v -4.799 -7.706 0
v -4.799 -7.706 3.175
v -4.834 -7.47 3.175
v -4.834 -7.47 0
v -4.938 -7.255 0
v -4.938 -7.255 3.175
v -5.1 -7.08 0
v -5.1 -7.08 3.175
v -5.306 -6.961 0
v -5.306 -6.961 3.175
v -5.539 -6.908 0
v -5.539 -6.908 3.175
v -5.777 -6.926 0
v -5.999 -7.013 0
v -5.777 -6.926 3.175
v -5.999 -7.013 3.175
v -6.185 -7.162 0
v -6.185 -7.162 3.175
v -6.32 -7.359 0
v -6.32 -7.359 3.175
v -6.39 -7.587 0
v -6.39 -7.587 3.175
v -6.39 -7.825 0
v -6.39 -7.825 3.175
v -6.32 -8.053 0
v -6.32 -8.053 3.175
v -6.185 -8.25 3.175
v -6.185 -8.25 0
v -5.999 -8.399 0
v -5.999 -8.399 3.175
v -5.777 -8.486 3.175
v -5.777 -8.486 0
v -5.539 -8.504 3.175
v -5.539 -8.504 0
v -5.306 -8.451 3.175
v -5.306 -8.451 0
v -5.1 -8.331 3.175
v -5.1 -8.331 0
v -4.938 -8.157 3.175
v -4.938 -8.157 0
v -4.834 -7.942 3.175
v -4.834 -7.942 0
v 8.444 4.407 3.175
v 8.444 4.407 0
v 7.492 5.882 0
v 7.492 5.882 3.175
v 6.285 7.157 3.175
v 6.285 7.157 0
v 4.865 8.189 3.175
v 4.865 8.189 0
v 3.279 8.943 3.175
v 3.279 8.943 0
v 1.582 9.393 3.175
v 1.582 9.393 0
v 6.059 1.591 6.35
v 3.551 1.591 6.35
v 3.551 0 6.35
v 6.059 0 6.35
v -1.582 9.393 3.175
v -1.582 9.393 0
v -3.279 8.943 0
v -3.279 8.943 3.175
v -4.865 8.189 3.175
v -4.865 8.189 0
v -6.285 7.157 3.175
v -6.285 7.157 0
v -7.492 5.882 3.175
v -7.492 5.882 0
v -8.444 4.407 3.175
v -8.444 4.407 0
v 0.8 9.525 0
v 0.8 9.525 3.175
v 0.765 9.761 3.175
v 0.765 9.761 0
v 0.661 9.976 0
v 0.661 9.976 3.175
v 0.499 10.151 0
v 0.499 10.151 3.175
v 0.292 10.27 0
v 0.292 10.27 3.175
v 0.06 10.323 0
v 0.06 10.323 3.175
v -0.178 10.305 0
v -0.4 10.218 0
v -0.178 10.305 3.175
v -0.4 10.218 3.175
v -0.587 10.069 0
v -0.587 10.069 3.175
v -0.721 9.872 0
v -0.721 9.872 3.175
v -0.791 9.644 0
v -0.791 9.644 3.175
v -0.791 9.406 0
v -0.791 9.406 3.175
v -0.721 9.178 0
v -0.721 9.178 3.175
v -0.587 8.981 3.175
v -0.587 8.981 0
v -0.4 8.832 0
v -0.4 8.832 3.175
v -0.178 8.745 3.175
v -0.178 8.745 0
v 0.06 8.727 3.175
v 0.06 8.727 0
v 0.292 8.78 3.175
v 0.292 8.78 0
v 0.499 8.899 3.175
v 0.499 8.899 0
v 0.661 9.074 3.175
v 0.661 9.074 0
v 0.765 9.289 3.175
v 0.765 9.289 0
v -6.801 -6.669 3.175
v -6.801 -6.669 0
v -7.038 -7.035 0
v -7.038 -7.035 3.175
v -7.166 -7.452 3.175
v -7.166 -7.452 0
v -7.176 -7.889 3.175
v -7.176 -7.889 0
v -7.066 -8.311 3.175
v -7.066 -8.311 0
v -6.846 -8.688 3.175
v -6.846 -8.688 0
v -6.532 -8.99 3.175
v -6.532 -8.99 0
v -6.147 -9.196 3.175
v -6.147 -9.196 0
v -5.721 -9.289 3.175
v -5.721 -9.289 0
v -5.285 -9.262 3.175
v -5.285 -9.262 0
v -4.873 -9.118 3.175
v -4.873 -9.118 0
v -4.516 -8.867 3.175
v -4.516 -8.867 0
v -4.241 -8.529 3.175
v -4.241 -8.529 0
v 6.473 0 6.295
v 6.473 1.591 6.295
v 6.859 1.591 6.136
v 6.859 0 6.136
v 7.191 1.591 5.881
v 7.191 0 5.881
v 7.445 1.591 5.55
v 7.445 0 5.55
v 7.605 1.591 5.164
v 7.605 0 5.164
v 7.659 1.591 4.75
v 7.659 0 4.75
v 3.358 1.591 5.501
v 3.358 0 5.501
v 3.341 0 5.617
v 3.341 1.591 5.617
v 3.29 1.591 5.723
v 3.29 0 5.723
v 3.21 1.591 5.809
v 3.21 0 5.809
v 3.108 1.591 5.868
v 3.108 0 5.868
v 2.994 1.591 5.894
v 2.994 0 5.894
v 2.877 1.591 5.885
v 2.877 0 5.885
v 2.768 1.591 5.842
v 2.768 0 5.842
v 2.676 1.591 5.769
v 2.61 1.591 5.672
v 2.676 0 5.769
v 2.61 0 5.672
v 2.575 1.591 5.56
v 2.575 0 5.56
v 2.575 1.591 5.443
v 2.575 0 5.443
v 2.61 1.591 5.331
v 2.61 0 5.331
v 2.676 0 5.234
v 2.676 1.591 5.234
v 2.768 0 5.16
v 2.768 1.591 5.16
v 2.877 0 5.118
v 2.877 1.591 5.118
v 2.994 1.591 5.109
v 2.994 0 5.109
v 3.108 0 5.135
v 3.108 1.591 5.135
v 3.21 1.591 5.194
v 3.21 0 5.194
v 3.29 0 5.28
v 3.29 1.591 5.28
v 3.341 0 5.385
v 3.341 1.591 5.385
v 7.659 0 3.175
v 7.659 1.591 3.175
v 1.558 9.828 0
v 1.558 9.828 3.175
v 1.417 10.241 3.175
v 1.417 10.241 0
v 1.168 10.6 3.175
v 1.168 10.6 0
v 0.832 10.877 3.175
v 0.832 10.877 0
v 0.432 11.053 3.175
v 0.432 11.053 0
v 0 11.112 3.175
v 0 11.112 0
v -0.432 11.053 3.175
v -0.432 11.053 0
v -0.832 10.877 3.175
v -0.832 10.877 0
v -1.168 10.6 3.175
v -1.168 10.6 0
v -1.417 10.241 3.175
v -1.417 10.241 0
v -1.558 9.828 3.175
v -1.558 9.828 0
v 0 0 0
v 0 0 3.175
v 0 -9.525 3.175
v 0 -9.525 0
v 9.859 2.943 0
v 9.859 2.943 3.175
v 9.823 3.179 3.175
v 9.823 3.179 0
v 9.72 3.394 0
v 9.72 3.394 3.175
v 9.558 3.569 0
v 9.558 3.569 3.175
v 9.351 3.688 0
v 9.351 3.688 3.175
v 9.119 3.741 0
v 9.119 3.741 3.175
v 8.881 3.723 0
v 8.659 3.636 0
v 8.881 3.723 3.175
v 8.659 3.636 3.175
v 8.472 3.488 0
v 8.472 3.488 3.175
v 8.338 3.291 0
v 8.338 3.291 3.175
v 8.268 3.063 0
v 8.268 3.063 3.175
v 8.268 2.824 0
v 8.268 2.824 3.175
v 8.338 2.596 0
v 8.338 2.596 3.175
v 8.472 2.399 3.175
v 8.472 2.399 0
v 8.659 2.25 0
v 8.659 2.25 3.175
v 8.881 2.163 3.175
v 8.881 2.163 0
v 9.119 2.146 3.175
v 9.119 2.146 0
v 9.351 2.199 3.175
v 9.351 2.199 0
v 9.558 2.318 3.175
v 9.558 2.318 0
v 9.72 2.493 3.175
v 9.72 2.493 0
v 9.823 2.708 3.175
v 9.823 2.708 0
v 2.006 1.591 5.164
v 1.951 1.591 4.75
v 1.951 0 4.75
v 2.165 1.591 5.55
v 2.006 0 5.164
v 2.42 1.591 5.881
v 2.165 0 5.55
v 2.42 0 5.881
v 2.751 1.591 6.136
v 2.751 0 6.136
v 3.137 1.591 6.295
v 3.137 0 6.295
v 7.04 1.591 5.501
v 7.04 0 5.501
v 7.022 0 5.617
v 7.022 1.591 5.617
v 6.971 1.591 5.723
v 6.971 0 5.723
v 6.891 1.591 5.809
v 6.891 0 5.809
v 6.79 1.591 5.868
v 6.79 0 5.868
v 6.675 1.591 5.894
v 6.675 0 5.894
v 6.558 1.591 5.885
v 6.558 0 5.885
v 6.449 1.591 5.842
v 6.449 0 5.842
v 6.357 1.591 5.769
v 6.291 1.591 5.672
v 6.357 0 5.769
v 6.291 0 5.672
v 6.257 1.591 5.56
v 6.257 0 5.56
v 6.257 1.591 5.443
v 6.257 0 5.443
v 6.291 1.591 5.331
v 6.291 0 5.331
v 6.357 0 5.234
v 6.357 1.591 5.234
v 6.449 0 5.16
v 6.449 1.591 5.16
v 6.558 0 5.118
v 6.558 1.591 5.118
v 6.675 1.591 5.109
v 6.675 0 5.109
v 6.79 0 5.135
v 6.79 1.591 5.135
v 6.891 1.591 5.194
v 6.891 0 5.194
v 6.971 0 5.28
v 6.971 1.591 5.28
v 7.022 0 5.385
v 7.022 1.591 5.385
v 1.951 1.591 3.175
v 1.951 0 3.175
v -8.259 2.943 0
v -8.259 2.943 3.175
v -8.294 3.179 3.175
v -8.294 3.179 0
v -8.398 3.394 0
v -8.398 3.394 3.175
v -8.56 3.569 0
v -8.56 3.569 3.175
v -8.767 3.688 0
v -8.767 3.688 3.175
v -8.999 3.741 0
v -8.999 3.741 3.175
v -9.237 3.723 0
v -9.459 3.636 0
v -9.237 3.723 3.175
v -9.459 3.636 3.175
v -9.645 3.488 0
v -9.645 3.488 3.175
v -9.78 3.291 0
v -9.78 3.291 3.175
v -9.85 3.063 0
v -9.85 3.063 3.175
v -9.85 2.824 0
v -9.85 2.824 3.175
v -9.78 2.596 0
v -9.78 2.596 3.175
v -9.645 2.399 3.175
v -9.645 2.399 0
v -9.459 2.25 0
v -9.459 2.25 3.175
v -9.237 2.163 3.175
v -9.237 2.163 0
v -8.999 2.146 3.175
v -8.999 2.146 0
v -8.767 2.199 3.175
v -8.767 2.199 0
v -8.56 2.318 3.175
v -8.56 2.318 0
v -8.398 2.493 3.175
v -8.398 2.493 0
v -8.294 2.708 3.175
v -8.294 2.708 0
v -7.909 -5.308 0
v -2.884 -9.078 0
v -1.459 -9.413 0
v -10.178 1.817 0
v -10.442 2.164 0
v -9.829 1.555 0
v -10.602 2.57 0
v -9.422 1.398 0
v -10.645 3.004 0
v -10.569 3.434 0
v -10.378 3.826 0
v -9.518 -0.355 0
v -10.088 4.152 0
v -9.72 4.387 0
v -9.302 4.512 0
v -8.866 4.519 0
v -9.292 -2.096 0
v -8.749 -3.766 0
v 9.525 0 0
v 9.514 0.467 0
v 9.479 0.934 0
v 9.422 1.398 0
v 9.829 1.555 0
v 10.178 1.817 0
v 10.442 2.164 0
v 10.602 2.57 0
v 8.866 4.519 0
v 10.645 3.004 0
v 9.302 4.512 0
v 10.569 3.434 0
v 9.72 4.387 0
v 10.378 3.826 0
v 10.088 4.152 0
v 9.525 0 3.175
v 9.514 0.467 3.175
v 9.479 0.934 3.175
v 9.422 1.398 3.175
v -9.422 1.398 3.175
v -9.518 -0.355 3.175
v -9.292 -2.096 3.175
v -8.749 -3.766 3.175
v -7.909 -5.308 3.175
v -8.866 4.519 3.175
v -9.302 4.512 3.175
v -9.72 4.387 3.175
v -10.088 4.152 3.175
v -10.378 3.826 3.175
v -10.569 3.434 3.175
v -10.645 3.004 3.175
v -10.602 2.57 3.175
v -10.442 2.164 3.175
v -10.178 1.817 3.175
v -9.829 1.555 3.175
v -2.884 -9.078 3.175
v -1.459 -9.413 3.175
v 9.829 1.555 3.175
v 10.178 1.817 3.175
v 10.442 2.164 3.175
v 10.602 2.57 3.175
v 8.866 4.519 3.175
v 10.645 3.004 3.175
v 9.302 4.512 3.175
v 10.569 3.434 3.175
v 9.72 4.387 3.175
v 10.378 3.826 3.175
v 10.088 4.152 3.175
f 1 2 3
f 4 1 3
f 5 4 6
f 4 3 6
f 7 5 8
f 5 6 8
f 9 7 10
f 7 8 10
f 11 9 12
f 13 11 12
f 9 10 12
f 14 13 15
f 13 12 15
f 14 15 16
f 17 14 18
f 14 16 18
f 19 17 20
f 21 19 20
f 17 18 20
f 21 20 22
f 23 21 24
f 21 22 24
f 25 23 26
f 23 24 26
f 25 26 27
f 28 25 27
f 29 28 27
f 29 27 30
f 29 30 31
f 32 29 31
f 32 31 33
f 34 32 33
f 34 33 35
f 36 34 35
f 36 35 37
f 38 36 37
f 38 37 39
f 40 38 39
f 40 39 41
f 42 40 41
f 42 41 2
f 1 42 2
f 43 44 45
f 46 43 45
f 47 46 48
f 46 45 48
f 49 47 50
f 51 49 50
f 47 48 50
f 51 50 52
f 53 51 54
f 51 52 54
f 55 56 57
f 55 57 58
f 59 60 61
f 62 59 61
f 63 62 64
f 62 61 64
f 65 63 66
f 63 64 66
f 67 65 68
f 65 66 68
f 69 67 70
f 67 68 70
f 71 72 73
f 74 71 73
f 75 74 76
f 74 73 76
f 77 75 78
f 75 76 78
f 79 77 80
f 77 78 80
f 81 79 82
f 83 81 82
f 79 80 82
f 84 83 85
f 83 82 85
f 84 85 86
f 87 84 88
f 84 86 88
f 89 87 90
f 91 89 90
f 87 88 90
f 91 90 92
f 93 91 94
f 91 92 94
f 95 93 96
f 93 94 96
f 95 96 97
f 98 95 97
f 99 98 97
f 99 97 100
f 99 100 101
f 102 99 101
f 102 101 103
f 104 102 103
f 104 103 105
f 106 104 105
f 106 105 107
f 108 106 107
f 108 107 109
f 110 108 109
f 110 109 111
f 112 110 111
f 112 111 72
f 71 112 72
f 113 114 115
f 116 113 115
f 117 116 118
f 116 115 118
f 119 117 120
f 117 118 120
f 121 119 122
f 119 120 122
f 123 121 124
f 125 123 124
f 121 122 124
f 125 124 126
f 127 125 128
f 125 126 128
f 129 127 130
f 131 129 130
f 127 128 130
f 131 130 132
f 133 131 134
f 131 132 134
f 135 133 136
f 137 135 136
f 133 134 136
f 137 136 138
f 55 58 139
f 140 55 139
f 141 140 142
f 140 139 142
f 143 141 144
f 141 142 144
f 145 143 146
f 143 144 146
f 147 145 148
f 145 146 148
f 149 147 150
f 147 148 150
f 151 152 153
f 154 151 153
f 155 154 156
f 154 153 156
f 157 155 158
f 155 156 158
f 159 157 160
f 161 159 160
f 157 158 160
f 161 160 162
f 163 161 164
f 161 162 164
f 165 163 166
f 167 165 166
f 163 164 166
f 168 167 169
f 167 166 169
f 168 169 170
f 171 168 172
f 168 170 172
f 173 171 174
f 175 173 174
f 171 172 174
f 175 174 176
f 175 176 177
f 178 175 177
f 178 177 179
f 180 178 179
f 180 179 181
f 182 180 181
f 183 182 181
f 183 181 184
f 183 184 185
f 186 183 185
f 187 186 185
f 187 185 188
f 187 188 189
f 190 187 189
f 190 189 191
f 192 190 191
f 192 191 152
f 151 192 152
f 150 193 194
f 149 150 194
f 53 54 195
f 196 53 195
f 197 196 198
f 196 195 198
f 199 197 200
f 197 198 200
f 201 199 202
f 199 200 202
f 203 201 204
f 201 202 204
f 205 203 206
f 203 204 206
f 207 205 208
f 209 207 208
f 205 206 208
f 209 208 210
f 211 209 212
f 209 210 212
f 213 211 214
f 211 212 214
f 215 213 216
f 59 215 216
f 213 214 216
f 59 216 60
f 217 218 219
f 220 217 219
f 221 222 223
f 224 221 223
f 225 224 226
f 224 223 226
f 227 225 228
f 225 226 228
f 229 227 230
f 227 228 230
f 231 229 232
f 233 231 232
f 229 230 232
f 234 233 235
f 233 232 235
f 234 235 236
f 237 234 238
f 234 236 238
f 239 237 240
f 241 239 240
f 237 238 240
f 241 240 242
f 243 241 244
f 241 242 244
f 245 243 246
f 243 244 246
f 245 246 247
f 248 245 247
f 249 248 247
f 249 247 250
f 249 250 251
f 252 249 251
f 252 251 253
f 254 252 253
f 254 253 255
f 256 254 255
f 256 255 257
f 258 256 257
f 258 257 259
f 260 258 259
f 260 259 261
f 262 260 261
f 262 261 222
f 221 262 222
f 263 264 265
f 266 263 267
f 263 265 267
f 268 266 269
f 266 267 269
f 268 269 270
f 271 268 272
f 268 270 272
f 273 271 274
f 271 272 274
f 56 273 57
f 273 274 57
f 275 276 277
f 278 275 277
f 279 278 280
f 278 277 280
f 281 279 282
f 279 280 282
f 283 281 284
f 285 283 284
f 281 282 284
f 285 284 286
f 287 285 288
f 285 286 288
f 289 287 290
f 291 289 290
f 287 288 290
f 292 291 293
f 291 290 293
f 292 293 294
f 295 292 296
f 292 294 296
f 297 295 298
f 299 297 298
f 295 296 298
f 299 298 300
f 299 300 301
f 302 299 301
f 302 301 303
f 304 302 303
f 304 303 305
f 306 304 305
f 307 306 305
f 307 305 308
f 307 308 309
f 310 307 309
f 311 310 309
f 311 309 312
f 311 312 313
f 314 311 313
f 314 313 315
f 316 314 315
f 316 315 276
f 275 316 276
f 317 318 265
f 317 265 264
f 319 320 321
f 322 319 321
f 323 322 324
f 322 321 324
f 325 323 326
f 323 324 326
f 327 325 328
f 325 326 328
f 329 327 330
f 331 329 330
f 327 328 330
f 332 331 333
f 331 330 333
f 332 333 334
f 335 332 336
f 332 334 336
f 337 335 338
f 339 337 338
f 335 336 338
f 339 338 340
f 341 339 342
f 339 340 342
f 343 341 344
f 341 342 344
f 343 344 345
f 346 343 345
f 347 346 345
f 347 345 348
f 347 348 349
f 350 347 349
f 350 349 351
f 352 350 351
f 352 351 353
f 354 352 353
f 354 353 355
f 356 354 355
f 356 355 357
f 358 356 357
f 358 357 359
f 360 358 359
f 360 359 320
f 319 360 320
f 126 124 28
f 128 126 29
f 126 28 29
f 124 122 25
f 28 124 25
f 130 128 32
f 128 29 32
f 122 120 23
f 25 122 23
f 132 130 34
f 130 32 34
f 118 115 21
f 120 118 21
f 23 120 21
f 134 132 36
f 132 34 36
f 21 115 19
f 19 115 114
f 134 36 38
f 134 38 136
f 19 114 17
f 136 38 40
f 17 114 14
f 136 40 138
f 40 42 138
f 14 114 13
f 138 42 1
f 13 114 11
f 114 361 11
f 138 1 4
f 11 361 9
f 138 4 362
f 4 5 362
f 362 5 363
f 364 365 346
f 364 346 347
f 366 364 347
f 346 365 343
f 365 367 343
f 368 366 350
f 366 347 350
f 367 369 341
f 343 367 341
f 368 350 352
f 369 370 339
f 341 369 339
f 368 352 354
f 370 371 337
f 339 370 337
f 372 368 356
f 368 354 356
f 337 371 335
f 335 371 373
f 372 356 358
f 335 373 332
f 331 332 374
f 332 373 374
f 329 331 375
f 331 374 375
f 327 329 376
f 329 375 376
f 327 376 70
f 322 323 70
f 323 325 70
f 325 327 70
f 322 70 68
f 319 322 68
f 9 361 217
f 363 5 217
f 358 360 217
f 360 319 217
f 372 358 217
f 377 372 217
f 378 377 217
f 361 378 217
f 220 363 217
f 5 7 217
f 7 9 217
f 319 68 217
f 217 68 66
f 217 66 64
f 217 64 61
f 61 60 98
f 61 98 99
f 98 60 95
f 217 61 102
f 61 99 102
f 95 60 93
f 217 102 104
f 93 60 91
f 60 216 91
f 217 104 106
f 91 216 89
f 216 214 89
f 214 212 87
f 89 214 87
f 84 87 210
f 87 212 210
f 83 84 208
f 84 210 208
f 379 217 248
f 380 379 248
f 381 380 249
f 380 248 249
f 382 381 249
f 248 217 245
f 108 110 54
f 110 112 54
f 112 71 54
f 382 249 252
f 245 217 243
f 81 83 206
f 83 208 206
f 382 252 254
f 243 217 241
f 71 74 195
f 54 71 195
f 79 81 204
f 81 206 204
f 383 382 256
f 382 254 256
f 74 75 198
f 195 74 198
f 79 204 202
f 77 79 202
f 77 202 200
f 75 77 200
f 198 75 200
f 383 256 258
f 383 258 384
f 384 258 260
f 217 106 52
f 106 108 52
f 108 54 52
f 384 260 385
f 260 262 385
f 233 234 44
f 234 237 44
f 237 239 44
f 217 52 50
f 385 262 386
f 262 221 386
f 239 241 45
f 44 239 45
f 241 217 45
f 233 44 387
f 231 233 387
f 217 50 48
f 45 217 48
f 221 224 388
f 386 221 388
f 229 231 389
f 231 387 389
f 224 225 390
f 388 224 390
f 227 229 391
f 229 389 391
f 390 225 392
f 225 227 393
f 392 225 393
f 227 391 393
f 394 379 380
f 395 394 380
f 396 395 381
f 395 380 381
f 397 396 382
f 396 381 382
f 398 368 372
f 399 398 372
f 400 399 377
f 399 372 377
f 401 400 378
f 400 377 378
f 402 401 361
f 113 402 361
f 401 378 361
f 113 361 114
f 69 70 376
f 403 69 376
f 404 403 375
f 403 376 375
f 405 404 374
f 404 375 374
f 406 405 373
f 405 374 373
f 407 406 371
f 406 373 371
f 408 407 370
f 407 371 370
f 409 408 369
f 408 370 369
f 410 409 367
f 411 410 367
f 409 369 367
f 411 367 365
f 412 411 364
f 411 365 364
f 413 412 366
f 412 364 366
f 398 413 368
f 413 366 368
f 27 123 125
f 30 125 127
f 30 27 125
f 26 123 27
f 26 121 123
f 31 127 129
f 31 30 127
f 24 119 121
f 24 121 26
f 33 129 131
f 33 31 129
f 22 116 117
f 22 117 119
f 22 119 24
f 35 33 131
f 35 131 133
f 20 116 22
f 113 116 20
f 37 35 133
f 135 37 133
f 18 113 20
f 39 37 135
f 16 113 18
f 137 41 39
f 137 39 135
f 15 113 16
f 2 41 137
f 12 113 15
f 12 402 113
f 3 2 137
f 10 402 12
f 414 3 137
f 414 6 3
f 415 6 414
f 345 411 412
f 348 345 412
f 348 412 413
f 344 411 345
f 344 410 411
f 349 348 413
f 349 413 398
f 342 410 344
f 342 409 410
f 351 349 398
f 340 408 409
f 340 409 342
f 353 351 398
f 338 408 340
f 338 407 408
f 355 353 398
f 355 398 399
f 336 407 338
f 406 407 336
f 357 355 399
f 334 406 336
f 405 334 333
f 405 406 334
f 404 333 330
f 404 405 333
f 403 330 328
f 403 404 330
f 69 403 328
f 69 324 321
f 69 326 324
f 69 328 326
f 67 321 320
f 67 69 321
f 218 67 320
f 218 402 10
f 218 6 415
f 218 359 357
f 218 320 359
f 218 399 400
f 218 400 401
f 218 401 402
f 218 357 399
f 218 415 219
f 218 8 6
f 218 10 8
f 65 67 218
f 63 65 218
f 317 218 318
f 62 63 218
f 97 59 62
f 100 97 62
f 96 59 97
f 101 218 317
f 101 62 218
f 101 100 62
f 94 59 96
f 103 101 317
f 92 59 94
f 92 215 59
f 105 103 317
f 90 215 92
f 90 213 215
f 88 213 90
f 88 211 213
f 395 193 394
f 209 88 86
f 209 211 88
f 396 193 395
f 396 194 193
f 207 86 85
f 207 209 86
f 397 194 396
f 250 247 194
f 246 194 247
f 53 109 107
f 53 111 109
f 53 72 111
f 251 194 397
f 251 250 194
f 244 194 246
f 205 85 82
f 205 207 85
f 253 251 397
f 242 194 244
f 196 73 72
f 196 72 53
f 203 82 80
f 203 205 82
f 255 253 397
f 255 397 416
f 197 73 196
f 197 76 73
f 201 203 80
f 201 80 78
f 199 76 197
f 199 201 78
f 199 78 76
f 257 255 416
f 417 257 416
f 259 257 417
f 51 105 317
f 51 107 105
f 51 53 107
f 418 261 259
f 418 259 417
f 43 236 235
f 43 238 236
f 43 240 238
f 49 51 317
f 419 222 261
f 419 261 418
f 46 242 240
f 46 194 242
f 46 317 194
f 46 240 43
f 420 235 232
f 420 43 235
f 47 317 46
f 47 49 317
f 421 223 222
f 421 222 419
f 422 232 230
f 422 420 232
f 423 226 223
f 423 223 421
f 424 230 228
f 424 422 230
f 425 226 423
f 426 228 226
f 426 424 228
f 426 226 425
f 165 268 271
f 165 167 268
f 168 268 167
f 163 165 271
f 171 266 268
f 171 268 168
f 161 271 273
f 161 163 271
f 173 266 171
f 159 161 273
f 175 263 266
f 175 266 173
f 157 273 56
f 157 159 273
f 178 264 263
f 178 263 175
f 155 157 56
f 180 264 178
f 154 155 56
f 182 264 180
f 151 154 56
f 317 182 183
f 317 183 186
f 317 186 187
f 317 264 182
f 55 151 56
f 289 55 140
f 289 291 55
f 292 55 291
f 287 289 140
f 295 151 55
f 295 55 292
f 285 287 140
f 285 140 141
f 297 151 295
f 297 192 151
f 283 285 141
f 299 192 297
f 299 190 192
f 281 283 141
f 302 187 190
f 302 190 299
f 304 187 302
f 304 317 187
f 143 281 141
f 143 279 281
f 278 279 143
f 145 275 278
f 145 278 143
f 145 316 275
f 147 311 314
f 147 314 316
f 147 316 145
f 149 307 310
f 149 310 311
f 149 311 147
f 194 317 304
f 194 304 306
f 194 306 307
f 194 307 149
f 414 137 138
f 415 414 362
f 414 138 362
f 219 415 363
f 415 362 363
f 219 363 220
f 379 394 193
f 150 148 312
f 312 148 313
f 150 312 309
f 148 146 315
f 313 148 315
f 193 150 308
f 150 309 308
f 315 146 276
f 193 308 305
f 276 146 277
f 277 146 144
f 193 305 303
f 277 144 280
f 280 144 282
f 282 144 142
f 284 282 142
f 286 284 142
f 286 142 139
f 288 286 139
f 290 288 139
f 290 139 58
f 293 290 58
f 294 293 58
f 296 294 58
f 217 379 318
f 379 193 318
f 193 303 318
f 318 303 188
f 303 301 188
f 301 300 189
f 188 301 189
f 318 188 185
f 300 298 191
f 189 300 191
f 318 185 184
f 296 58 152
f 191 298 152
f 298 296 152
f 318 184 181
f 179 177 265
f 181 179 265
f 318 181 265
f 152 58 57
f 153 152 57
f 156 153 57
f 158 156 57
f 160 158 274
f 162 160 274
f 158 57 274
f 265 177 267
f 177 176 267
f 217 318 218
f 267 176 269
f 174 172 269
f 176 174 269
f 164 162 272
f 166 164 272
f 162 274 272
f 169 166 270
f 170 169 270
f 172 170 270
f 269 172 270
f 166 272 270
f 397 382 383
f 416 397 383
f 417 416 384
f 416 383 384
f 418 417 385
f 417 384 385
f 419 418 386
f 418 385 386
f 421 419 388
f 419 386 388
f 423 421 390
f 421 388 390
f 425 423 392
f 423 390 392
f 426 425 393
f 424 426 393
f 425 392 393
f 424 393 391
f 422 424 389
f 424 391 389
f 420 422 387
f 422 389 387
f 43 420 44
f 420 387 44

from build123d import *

# Parameters (mm, degrees)
F2_DEPTH  = 3.175
F4_DEPTH  = 3.175
F5_R      = 0.8001
F6_DEPTH  = 3.2004
F7_R      = 0.8001
F8_DEPTH  = 25.4
F9_W      = 5.7083697757
F9_H      = 1.5914540656
F10_DEPTH = 3.175
F12_DEPTH = 25.4
F13_R     = 0.3937
F14_DEPTH = 25.4


with BuildPart() as f2:
    # F1 (on face) → F2 (new body)
    with BuildSketch(Plane.XY):
        with BuildLine():
            ThreePointArc((-1.5819782441, 9.3927083333), (-6.1504992572, -7.2730312723), (9.525, 0))
            ThreePointArc((9.525, 0), (7.2730312723, 6.1504992572), (1.5819782441, 9.3927083333))
            ThreePointArc((1.5819782441, 9.3927083333), (1.191708121, 9.4501564407), (0.7993940003, 9.4913958))
            ThreePointArc((0.7993940003, 9.4913958), (0, 8.7249), (-0.7993940003, 9.4913958))
            ThreePointArc((-0.7993940003, 9.4913958), (-1.191708121, 9.4501564407), (-1.5819782441, 9.3927083333))
        make_face()
        with BuildLine():
            ThreePointArc((0.7993940003, 9.4913958), (1.191708121, 9.4501564407), (1.5819782441, 9.3927083333))
            ThreePointArc((1.5819782441, 9.3927083333), (0, 11.1125), (-1.5819782441, 9.3927083333))
            ThreePointArc((-1.5819782441, 9.3927083333), (-1.191708121, 9.4501564407), (-0.7993940003, 9.4913958))
            ThreePointArc((-0.7993940003, 9.4913958), (-0.0168058077, 10.3249234806), (0.8001, 9.525))
            ThreePointArc((0.8001, 9.525), (0.7999234806, 9.5081941923), (0.7993940003, 9.4913958))
        make_face()
    extrude(amount=F2_DEPTH)

    # F3 (on Top) → F4 (join)
    with BuildSketch(Plane.XY):
        with BuildLine():
            ThreePointArc((0.7993940003, 9.4913958), (1.191708121, 9.4501564407), (1.5819782441, 9.3927083333))
            ThreePointArc((1.5819782441, 9.3927083333), (0, 11.1125), (-1.5819782441, 9.3927083333))
            ThreePointArc((-1.5819782441, 9.3927083333), (-1.191708121, 9.4501564407), (-0.7993940003, 9.4913958))
            ThreePointArc((-0.7993940003, 9.4913958), (-0.0168058077, 10.3249234806), (0.8001, 9.525))
            ThreePointArc((0.8001, 9.525), (0.7999234806, 9.5081941923), (0.7993940003, 9.4913958))
        make_face()
        with BuildLine():
            ThreePointArc((-0.7993940003, 9.4913958), (0, 9.525), (0.7993940003, 9.4913958))
            ThreePointArc((0.7993940003, 9.4913958), (0.7999234806, 9.5081941923), (0.8001, 9.525))
            ThreePointArc((0.8001, 9.525), (-0.0168058077, 10.3249234806), (-0.7993940003, 9.4913958))
        make_face()
        with BuildLine():
            ThreePointArc((4.2410481532, -8.5287241462), (6.5317636161, -8.99020135), (6.8007427217, -6.6689971835))
            ThreePointArc((6.8007427217, -6.6689971835), (6.51877471, -6.9448687015), (6.2256258064, -7.2088284984))
            ThreePointArc((6.2256258064, -7.2088284984), (6.3542336867, -7.4427136488), (6.3987545281, -7.7058868714))
            ThreePointArc((6.3987545281, -7.7058868714), (5.8298612048, -8.4718525904), (4.9321791435, -8.1485725067))
            ThreePointArc((4.9321791435, -8.1485725067), (4.5905504655, -8.3458056186), (4.2410481532, -8.5287241462))
        make_face()
        with BuildLine():
            ThreePointArc((4.9321791435, -8.1485725067), (5.5986545281, -7.7058868714), (6.2256258064, -7.2088284984))
            ThreePointArc((6.2256258064, -7.2088284984), (5.1283675477, -7.0585923742), (4.9321791435, -8.1485725067))
        make_face()
        with BuildLine():
            ThreePointArc((9.4218546282, 1.3979557805), (10.5686155373, 3.43395135), (8.4441383039, 4.4070572159))
            ThreePointArc((8.4441383039, 4.4070572159), (8.6193748012, 4.0536407137), (8.779827493, 3.6932714756))
            ThreePointArc((8.779827493, 3.6932714756), (9.5154003585, 3.6004167674), (9.8589133177, 2.9433868714))
            ThreePointArc((9.8589133177, 2.9433868714), (9.6960868018, 2.4596074625), (9.2738801556, 2.1727337295))
            ThreePointArc((9.2738801556, 2.1727337295), (9.3558909247, 1.7868771657), (9.4218546282, 1.3979557805))
        make_face()
        with BuildLine():
            ThreePointArc((9.2738801556, 2.1727337295), (9.0588133177, 2.9433868714), (8.779827493, 3.6932714756))
            ThreePointArc((8.779827493, 3.6932714756), (8.297872999, 2.6961423742), (9.2738801556, 2.1727337295))
        make_face()
        with BuildLine():
            ThreePointArc((-8.2587133177, 2.9433868714), (-8.4017834218, 3.3999739122), (-8.779827493, 3.6932714756))
            ThreePointArc((-8.779827493, 3.6932714756), (-9.0588133177, 2.9433868714), (-9.2738801556, 2.1727337295))
            ThreePointArc((-9.2738801556, 2.1727337295), (-8.5750339088, 2.3061133873), (-8.2587133177, 2.9433868714))
        make_face()
        with BuildLine():
            ThreePointArc((-6.2256258064, -7.2088284984), (-6.51877471, -6.9448687015), (-6.8007427217, -6.6689971835))
            ThreePointArc((-6.8007427217, -6.6689971835), (-6.5317636161, -8.99020135), (-4.2410481532, -8.5287241462))
            ThreePointArc((-4.2410481532, -8.5287241462), (-4.5905504655, -8.3458056186), (-4.9321791435, -8.1485725067))
            ThreePointArc((-4.9321791435, -8.1485725067), (-6.0689415084, -8.3531813686), (-6.2256258064, -7.2088284984))
        make_face()
        with BuildLine():
            ThreePointArc((-4.7985545281, -7.7058868714), (-5.3354813054, -6.9503077128), (-6.2256258064, -7.2088284984))
            ThreePointArc((-6.2256258064, -7.2088284984), (-5.5986545281, -7.7058868714), (-4.9321791435, -8.1485725067))
            ThreePointArc((-4.9321791435, -8.1485725067), (-4.8326888091, -7.9370935482), (-4.7985545281, -7.7058868714))
        make_face()
        with BuildLine():
            ThreePointArc((-0.7993940003, 9.4913958), (0, 8.7249), (0.7993940003, 9.4913958))
            ThreePointArc((0.7993940003, 9.4913958), (0, 9.525), (-0.7993940003, 9.4913958))
        make_face()
        with BuildLine():
            ThreePointArc((6.3987545281, -7.7058868714), (6.3542336867, -7.4427136488), (6.2256258064, -7.2088284984))
            ThreePointArc((6.2256258064, -7.2088284984), (5.5986545281, -7.7058868714), (4.9321791435, -8.1485725067))
            ThreePointArc((4.9321791435, -8.1485725067), (5.8298612048, -8.4718525904), (6.3987545281, -7.7058868714))
        make_face()
        with BuildLine():
            ThreePointArc((9.8589133177, 2.9433868714), (9.5154003585, 3.6004167674), (8.779827493, 3.6932714756))
            ThreePointArc((8.779827493, 3.6932714756), (9.0588133177, 2.9433868714), (9.2738801556, 2.1727337295))
            ThreePointArc((9.2738801556, 2.1727337295), (9.6960868018, 2.4596074625), (9.8589133177, 2.9433868714))
        make_face()
        with BuildLine():
            ThreePointArc((-9.2738801556, 2.1727337295), (-9.0588133177, 2.9433868714), (-8.779827493, 3.6932714756))
            ThreePointArc((-8.779827493, 3.6932714756), (-9.8197536364, 3.1906313686), (-9.2738801556, 2.1727337295))
        make_face()
        with BuildLine():
            ThreePointArc((-4.9321791435, -8.1485725067), (-5.5986545281, -7.7058868714), (-6.2256258064, -7.2088284984))
            ThreePointArc((-6.2256258064, -7.2088284984), (-6.0689415084, -8.3531813686), (-4.9321791435, -8.1485725067))
        make_face()
        with BuildLine():
            ThreePointArc((-8.779827493, 3.6932714756), (-8.6193748012, 4.0536407137), (-8.4441383039, 4.4070572159))
            ThreePointArc((-8.4441383039, 4.4070572159), (-10.5686155373, 3.43395135), (-9.4218546282, 1.3979557805))
            ThreePointArc((-9.4218546282, 1.3979557805), (-9.3558909247, 1.7868771657), (-9.2738801556, 2.1727337295))
            ThreePointArc((-9.2738801556, 2.1727337295), (-9.8197536364, 3.1906313686), (-8.779827493, 3.6932714756))
        make_face()
    extrude(amount=F4_DEPTH)

    # F5 (on face) → F6 (cut)
    with BuildSketch(Plane.XY.offset(3.175)):
        with Locations((0, 9.525)):
            Circle(F5_R)
        with Locations((-9.0588133177, 2.9433868714)):
            Circle(F5_R)
        with Locations((-5.5986545281, -7.7058868714)):
            Circle(F5_R)
        with Locations((5.5986545281, -7.7058868714)):
            Circle(F5_R)
        with Locations((9.0588133177, 2.9433868714)):
            Circle(F5_R)
    extrude(amount=-F6_DEPTH, mode=Mode.SUBTRACT)

    # F7 (on face) → F8 (cut)
    with BuildSketch(Plane.XY.offset(3.175)):
        with BuildLine():
            ThreePointArc((6.8007427217, -6.6689971835), (8.8176725791, -3.6019821332), (9.525, 0))
            Line((9.525, 0), (0, 0))
            Line((0, 0), (0, -9.525))
            ThreePointArc((0, -9.525), (2.1782478632, -9.2725865456), (4.2410481532, -8.5287241462))
            ThreePointArc((4.2410481532, -8.5287241462), (6.5317636161, -8.99020135), (6.8007427217, -6.6689971835))
        make_face()
        with Locations((5.5986545281, -7.7058868714)):
            Circle(F7_R, mode=Mode.SUBTRACT)
    extrude(amount=-F8_DEPTH, mode=Mode.SUBTRACT)

    # F9 (on face) → F10 (join)
    with BuildSketch(Plane.XY.offset(3.175)):
        with Locations((4.8052559723, 0.7957270328)):
            Rectangle(F9_W, F9_H)
    extrude(amount=F10_DEPTH)

    # F11 (on face) → F12 (cut)
    with BuildSketch(Plane.XZ):
        with BuildLine():
            Line((1.9510710845, 6.35), (1.9510710845, 4.7498))
            ThreePointArc((1.9510710845, 4.7498), (2.4197588132, 5.8813122713), (3.5512710845, 6.35))
            Line((3.5512710845, 6.35), (1.9510710845, 6.35))
        make_face()
        with BuildLine():
            Line((7.6594408602, 6.35), (6.0592408602, 6.35))
            ThreePointArc((6.0592408602, 6.35), (7.1907531314, 5.8813122713), (7.6594408602, 4.7498))
            Line((7.6594408602, 4.7498), (7.6594408602, 6.35))
        make_face()
    extrude(amount=-F12_DEPTH, mode=Mode.SUBTRACT)

    # F13 (on face) → F14 (cut)
    with BuildSketch(Plane.XZ):
        with Locations((6.645900663, 5.5013904348)):
            Circle(F13_R)
        with Locations((2.9646112816, 5.5013904348)):
            Circle(F13_R)
    extrude(amount=-F14_DEPTH, mode=Mode.SUBTRACT)


solid = f2.part
